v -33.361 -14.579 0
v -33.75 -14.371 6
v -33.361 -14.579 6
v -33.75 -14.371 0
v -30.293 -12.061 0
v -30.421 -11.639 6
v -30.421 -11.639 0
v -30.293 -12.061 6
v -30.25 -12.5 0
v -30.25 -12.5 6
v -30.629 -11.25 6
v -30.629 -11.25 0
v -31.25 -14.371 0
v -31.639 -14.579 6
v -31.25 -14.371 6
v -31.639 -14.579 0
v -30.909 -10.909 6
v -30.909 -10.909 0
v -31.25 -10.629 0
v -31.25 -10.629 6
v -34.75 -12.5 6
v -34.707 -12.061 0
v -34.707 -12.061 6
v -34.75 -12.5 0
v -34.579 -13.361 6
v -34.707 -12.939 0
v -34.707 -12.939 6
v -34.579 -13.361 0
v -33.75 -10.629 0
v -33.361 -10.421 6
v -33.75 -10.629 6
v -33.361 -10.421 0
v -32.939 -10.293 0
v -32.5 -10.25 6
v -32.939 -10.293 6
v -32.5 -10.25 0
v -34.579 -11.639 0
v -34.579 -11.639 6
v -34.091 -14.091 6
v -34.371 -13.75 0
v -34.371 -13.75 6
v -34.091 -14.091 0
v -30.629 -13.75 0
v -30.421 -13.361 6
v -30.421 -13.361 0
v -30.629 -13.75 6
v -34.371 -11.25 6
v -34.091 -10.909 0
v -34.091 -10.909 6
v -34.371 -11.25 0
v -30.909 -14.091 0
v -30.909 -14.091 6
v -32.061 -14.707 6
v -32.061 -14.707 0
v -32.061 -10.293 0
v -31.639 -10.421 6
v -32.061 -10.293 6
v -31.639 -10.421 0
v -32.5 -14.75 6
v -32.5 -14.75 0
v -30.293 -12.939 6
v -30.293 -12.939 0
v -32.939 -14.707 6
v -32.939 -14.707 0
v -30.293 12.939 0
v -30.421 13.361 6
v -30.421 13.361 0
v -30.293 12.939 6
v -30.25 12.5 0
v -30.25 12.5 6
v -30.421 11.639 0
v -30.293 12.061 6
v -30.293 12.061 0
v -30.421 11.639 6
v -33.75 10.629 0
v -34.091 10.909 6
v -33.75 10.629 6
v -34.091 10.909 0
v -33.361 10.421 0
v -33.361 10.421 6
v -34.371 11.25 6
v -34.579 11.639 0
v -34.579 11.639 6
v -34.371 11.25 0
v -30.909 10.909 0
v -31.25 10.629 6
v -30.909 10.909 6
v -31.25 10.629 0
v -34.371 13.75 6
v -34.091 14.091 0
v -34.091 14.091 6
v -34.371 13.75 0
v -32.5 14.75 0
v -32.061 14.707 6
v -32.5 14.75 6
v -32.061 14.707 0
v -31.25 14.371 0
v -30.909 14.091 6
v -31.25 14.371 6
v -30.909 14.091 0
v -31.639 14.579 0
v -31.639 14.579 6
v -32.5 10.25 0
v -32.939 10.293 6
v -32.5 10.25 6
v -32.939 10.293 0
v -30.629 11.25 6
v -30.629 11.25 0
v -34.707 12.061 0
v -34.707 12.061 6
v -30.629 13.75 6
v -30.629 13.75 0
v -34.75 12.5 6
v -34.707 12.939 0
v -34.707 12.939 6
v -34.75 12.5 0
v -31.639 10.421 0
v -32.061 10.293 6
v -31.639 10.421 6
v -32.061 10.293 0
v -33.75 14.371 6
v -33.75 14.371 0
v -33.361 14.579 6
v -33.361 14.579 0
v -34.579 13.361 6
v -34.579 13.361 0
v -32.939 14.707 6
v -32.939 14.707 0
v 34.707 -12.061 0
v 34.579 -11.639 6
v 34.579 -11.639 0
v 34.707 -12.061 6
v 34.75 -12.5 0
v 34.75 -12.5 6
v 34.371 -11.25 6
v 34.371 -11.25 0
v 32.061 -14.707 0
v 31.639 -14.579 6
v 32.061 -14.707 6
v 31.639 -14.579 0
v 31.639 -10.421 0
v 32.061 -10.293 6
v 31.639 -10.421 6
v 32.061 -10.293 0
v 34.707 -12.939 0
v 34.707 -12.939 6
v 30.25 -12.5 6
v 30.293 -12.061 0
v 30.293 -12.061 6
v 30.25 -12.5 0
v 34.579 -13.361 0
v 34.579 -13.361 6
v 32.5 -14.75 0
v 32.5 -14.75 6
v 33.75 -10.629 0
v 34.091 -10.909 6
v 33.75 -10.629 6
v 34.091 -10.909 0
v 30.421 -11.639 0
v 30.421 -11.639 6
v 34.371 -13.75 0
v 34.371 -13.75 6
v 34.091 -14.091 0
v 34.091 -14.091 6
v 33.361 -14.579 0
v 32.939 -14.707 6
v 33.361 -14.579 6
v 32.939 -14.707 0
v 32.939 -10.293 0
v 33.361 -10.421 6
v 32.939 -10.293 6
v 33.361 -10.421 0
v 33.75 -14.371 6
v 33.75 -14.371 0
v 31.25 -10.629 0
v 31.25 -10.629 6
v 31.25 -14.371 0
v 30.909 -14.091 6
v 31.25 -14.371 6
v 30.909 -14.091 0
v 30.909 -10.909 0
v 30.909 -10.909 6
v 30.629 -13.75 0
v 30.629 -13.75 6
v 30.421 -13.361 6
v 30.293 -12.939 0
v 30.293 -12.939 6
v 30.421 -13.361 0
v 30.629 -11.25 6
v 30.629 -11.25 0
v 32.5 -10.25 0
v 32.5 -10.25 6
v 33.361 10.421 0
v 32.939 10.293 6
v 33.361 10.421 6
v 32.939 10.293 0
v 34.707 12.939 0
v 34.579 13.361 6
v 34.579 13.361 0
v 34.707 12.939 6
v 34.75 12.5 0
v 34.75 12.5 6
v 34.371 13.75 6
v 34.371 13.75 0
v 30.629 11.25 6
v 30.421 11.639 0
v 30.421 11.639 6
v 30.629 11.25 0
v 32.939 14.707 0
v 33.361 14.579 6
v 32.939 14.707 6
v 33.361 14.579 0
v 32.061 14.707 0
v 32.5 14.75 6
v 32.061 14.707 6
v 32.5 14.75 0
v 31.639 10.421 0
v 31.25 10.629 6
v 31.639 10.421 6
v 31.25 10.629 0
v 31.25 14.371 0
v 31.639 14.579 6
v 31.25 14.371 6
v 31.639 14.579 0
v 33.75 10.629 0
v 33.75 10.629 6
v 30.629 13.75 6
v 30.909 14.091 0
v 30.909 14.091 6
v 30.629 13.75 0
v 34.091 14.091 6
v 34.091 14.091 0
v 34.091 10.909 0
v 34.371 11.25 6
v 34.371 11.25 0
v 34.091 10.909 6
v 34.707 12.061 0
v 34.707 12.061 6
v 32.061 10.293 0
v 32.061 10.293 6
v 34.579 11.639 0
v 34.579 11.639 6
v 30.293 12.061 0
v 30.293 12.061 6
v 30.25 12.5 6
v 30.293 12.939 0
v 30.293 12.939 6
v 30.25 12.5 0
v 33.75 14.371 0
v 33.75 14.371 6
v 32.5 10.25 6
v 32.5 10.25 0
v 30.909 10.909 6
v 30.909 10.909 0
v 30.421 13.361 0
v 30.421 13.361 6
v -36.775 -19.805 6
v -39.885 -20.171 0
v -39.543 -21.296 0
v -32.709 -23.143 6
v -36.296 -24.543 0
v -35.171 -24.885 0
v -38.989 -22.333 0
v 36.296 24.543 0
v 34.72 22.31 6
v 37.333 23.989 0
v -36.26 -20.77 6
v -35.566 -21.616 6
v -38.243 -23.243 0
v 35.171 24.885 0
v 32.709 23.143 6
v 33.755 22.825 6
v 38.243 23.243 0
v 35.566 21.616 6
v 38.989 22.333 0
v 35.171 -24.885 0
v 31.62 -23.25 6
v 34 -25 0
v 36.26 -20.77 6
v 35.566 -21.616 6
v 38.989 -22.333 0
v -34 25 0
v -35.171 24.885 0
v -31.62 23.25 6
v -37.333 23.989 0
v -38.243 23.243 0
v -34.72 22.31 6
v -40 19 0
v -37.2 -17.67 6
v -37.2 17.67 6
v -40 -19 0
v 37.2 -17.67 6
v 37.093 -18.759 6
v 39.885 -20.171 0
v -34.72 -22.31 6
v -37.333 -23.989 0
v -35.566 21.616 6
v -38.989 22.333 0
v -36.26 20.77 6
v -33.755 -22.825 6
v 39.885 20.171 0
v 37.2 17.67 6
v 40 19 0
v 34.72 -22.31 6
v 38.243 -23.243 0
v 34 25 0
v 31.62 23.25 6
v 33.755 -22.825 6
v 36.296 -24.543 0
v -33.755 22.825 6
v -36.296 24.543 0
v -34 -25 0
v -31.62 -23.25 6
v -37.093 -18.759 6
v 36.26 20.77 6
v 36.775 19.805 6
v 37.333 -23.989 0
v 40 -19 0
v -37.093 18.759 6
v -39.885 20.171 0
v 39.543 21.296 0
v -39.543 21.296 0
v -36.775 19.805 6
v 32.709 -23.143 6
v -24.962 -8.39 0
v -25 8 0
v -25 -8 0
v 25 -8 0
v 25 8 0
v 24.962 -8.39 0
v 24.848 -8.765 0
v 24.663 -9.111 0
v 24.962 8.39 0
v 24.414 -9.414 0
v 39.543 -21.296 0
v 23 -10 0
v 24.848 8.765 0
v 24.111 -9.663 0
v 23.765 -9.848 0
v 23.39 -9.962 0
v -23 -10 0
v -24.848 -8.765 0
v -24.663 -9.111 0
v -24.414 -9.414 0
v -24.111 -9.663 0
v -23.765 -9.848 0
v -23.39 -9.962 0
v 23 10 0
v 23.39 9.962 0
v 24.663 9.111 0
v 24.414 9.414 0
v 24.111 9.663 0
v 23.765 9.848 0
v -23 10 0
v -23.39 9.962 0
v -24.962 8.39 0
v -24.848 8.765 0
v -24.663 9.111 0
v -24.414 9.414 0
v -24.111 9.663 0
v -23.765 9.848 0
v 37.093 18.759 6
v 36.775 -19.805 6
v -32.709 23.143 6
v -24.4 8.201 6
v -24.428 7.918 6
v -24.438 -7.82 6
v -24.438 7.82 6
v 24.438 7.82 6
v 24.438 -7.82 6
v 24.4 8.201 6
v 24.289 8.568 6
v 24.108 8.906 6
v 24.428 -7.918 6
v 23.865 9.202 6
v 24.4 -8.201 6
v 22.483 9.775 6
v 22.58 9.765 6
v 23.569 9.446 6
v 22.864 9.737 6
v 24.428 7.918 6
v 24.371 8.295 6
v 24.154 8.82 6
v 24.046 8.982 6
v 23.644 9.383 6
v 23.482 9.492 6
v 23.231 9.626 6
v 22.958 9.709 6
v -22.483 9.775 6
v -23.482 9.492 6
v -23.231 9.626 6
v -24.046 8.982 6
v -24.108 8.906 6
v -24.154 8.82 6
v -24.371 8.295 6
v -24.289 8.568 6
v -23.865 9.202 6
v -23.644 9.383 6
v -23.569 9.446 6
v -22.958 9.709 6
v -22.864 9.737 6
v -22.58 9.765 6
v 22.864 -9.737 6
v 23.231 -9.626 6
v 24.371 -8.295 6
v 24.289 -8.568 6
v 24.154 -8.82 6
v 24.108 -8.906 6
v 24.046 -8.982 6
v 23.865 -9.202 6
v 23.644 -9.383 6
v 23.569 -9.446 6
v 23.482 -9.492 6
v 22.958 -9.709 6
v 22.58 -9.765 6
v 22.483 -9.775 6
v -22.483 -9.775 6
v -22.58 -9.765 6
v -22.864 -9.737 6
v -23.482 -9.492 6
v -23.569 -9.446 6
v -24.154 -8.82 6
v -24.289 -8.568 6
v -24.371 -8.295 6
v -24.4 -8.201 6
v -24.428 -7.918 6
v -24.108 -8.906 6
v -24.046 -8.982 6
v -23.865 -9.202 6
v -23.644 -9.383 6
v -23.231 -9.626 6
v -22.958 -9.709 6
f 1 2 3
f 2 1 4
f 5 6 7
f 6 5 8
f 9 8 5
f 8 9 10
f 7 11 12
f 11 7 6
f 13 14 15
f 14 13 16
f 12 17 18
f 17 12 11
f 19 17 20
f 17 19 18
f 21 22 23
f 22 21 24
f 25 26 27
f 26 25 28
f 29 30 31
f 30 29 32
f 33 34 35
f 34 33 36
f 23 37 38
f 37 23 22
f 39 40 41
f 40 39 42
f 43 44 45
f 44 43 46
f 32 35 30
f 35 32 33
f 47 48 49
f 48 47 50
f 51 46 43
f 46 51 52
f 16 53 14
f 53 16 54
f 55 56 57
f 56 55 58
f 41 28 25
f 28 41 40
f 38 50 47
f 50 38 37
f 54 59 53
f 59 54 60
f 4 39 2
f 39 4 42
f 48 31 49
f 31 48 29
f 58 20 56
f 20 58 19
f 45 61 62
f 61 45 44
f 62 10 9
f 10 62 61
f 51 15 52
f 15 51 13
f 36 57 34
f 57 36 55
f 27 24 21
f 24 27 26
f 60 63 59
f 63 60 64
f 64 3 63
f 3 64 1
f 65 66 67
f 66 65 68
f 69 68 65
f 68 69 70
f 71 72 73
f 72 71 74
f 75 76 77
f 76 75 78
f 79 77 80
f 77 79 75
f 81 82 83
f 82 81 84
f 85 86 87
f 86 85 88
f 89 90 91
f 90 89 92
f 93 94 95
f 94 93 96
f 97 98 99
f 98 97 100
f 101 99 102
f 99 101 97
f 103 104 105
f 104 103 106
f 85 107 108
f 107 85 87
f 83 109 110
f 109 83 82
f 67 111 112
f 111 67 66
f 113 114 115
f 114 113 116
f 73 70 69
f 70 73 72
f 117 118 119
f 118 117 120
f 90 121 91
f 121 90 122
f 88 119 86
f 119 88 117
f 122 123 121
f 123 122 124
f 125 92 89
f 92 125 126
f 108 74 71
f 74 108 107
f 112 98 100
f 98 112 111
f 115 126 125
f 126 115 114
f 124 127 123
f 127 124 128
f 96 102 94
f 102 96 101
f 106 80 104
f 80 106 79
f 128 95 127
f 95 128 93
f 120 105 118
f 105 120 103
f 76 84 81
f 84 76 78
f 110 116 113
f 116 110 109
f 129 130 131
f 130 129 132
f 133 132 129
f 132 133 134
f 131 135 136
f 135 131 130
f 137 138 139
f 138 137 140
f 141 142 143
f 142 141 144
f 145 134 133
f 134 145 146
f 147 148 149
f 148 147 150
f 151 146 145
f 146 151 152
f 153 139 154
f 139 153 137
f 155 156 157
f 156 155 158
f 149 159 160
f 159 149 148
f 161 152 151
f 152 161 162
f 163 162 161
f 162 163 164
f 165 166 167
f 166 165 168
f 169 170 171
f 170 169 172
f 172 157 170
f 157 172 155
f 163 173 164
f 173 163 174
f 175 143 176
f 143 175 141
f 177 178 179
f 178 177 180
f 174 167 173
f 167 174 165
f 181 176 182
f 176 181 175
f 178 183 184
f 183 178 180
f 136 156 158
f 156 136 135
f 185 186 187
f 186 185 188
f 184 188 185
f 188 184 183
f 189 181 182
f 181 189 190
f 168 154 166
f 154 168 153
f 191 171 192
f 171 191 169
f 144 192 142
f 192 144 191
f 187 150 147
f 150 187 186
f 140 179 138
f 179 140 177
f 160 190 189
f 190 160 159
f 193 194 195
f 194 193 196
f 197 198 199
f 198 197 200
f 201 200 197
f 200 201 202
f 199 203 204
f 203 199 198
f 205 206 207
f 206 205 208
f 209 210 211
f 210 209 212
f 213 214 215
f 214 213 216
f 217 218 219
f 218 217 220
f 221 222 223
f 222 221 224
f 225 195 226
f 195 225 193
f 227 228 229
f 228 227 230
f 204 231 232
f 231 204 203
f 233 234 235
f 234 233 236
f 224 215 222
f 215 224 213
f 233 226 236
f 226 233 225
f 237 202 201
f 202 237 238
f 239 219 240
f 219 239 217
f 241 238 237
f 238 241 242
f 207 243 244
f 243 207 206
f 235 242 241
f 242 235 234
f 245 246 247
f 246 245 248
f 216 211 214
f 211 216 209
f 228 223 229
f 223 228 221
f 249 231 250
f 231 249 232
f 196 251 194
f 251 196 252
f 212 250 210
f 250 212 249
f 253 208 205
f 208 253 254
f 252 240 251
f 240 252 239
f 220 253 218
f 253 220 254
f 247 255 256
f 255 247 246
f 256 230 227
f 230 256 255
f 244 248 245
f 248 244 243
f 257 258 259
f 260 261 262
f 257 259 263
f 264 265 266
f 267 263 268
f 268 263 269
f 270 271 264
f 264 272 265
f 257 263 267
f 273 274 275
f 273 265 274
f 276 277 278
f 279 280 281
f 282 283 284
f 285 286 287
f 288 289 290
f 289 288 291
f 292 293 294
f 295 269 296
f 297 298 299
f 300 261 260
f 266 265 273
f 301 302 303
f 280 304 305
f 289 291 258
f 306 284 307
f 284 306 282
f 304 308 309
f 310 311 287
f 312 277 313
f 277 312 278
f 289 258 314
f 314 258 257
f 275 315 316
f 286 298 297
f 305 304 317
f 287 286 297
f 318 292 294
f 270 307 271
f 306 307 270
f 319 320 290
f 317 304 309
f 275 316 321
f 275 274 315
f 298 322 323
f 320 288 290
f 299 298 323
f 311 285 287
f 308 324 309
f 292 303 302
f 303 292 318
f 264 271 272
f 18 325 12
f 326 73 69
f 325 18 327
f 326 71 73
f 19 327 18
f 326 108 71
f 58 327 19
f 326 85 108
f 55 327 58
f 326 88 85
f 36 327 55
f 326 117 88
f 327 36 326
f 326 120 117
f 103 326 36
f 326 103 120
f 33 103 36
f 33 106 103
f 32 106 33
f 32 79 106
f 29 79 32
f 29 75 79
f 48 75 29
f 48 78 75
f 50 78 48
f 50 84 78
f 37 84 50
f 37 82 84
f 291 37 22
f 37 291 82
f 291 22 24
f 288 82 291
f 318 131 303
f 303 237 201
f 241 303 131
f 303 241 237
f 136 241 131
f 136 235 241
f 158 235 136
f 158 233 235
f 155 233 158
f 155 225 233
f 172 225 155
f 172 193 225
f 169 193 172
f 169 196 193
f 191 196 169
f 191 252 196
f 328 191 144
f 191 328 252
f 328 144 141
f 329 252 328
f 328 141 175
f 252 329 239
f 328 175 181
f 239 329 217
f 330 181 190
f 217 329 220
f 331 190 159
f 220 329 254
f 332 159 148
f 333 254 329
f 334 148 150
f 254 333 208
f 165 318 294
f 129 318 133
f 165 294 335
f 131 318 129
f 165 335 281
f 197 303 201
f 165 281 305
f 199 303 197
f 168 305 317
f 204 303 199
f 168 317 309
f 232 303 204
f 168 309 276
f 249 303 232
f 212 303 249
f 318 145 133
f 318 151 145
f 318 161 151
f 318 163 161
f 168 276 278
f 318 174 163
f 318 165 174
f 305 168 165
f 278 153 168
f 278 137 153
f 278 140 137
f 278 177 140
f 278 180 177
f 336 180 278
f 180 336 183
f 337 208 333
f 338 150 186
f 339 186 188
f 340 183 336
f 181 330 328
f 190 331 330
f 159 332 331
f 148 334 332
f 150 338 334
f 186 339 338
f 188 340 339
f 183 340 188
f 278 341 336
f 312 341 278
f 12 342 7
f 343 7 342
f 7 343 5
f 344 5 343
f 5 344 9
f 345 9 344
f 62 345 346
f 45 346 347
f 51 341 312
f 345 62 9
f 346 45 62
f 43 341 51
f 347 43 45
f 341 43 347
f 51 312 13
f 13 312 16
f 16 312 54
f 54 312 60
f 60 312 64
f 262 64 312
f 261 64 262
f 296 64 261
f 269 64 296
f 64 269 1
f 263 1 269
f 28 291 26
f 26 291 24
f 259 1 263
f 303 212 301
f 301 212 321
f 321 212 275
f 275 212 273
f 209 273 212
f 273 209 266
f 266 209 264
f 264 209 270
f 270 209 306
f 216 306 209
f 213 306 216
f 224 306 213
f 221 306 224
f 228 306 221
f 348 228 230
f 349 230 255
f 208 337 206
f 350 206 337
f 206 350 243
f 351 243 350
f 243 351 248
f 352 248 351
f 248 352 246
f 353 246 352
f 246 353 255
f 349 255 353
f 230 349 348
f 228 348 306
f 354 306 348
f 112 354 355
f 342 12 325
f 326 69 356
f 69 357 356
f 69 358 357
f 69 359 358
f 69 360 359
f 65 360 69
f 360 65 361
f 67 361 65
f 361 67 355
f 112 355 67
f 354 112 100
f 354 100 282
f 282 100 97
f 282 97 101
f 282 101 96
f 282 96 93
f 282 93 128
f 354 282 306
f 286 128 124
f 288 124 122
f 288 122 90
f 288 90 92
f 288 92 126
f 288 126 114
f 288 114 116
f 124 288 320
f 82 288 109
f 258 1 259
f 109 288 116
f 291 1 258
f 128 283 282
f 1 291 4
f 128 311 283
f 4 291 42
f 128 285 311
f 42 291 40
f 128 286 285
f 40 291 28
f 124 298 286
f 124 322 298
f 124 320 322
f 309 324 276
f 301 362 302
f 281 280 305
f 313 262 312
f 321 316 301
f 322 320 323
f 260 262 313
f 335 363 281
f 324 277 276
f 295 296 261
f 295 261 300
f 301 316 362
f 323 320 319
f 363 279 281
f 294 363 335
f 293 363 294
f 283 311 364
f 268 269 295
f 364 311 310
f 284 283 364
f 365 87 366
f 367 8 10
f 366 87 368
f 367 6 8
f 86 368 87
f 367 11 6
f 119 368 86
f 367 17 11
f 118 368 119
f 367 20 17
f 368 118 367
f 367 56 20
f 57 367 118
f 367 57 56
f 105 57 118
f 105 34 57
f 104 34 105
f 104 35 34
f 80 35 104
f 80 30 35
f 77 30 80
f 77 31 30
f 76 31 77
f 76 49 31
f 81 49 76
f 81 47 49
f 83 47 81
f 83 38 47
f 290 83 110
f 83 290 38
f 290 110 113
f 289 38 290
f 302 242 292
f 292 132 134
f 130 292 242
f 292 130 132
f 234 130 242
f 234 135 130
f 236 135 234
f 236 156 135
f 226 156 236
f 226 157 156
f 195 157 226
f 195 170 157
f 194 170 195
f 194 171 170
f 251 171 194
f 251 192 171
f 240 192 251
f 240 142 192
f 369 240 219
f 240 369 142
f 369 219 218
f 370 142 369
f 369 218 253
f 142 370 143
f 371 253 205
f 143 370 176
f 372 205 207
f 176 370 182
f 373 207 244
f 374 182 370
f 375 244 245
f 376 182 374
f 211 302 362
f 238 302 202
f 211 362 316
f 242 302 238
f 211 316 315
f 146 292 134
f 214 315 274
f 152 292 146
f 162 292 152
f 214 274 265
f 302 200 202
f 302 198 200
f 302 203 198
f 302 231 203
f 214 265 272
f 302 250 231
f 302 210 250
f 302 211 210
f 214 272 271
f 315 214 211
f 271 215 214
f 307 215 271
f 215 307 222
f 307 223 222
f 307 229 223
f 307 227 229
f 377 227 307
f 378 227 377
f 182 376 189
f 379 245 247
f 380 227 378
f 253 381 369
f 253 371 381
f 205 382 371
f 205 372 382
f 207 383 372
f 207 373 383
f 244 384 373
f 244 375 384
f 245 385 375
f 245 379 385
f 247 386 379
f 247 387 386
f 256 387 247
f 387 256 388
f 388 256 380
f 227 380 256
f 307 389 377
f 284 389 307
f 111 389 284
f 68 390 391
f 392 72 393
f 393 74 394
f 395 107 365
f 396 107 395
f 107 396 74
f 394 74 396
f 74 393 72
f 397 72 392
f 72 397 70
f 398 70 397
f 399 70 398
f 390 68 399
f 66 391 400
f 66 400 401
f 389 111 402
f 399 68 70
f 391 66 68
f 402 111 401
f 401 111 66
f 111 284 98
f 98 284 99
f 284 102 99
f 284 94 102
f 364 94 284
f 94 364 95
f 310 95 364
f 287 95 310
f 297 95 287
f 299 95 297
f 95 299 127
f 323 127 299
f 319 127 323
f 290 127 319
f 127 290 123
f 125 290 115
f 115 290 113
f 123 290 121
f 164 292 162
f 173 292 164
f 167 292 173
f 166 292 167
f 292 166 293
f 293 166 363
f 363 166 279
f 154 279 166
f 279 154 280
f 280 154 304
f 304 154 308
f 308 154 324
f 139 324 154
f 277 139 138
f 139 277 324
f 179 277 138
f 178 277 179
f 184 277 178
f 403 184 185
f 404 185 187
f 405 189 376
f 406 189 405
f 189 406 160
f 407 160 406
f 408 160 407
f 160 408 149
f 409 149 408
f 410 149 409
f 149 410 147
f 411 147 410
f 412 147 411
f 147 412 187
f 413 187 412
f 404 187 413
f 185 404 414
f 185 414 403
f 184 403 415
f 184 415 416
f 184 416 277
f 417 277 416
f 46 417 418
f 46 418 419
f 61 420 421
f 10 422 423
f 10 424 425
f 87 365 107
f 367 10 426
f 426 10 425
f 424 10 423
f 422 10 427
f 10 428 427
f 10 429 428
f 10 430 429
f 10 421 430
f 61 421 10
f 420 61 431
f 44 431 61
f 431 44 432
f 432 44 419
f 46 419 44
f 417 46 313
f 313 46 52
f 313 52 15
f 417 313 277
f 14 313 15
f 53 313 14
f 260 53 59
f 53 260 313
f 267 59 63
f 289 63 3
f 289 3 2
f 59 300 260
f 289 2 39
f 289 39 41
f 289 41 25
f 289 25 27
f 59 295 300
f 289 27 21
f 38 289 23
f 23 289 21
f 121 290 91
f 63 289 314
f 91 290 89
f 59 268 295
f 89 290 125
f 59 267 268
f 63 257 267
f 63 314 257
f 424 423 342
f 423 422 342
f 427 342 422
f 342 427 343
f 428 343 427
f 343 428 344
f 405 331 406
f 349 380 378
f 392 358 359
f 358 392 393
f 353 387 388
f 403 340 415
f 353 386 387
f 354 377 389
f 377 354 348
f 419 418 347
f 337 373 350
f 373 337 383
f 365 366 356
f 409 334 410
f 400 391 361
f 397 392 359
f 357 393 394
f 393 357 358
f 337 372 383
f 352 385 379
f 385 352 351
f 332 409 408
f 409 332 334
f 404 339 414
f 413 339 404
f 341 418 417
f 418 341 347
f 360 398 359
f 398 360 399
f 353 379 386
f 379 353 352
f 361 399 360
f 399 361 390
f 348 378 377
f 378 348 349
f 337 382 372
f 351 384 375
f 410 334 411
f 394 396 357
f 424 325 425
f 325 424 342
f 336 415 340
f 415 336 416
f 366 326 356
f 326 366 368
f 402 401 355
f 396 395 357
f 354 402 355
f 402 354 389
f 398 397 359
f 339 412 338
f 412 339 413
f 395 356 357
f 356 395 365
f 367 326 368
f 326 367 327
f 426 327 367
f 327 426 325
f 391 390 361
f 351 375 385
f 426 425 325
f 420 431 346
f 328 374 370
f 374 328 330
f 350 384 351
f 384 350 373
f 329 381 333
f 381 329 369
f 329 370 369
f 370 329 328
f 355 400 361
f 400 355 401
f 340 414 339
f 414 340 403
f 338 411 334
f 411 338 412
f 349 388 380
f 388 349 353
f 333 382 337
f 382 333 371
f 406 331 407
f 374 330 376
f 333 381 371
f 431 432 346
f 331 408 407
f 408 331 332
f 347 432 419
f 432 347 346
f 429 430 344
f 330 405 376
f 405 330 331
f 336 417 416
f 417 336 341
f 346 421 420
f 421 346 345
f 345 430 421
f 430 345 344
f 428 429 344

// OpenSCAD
$fn = 32;

// ----------------------------------------------------------------------
// Display bezel: 80 x 50 mm frame, opening 50x20 mm
// ----------------------------------------------------------------------

// --- parameters (mm) ---
length = 80;              // frame outside length, X
width = 50;               // frame outside width, Y
frame_w = 15;             // frame width
thickness = 6;            // frame thickness
corner_r = 6;             // outside corner radius
chamfer = 0.93;           // outer wall taper
funnel = 0.97;            // inner opening taper
opening_l = 50;           // opening length
opening_w = 20;           // opening width
inner_r = 2;              // opening corner radius
hole_d = 4.5;             // mounting screw clearance
holes_per_side = 2;       // holes per short side
hole_inset = 7.5;         // hole centre inset from the outside edge

/* rounded-rectangle outlines, generated with loops */
module rounded_ring(l_nom, w_nom, r) {
  hull() {
    for (sx = [-1, 1]) for (sy = [-1, 1])
      translate([sx * (l_nom / 2 - r), sy * (w_nom / 2 - r)]) circle(r = r);
  }
}

difference() {
  /* frame body, drafted so the outer edge is a variable-depth chamfer */
  linear_extrude(height = thickness, scale = chamfer)
    rounded_ring(length, width, corner_r);
  /* viewing opening, drafted the other way for a funnel edge */
  linear_extrude(height = thickness + 2, scale = funnel)
    translate([0, 0, -1]) rounded_ring(opening_l, opening_w, inner_r);
  /* mounting screws through the frame lands */
  for (sx = [-1, 1]) for (i = [1 : holes_per_side])
    translate([sx * (length / 2 - hole_inset),
               (i - (holes_per_side + 1) / 2) * width * 0.5, -1])
      cylinder(h = thickness + 2, d = hole_d);
}
